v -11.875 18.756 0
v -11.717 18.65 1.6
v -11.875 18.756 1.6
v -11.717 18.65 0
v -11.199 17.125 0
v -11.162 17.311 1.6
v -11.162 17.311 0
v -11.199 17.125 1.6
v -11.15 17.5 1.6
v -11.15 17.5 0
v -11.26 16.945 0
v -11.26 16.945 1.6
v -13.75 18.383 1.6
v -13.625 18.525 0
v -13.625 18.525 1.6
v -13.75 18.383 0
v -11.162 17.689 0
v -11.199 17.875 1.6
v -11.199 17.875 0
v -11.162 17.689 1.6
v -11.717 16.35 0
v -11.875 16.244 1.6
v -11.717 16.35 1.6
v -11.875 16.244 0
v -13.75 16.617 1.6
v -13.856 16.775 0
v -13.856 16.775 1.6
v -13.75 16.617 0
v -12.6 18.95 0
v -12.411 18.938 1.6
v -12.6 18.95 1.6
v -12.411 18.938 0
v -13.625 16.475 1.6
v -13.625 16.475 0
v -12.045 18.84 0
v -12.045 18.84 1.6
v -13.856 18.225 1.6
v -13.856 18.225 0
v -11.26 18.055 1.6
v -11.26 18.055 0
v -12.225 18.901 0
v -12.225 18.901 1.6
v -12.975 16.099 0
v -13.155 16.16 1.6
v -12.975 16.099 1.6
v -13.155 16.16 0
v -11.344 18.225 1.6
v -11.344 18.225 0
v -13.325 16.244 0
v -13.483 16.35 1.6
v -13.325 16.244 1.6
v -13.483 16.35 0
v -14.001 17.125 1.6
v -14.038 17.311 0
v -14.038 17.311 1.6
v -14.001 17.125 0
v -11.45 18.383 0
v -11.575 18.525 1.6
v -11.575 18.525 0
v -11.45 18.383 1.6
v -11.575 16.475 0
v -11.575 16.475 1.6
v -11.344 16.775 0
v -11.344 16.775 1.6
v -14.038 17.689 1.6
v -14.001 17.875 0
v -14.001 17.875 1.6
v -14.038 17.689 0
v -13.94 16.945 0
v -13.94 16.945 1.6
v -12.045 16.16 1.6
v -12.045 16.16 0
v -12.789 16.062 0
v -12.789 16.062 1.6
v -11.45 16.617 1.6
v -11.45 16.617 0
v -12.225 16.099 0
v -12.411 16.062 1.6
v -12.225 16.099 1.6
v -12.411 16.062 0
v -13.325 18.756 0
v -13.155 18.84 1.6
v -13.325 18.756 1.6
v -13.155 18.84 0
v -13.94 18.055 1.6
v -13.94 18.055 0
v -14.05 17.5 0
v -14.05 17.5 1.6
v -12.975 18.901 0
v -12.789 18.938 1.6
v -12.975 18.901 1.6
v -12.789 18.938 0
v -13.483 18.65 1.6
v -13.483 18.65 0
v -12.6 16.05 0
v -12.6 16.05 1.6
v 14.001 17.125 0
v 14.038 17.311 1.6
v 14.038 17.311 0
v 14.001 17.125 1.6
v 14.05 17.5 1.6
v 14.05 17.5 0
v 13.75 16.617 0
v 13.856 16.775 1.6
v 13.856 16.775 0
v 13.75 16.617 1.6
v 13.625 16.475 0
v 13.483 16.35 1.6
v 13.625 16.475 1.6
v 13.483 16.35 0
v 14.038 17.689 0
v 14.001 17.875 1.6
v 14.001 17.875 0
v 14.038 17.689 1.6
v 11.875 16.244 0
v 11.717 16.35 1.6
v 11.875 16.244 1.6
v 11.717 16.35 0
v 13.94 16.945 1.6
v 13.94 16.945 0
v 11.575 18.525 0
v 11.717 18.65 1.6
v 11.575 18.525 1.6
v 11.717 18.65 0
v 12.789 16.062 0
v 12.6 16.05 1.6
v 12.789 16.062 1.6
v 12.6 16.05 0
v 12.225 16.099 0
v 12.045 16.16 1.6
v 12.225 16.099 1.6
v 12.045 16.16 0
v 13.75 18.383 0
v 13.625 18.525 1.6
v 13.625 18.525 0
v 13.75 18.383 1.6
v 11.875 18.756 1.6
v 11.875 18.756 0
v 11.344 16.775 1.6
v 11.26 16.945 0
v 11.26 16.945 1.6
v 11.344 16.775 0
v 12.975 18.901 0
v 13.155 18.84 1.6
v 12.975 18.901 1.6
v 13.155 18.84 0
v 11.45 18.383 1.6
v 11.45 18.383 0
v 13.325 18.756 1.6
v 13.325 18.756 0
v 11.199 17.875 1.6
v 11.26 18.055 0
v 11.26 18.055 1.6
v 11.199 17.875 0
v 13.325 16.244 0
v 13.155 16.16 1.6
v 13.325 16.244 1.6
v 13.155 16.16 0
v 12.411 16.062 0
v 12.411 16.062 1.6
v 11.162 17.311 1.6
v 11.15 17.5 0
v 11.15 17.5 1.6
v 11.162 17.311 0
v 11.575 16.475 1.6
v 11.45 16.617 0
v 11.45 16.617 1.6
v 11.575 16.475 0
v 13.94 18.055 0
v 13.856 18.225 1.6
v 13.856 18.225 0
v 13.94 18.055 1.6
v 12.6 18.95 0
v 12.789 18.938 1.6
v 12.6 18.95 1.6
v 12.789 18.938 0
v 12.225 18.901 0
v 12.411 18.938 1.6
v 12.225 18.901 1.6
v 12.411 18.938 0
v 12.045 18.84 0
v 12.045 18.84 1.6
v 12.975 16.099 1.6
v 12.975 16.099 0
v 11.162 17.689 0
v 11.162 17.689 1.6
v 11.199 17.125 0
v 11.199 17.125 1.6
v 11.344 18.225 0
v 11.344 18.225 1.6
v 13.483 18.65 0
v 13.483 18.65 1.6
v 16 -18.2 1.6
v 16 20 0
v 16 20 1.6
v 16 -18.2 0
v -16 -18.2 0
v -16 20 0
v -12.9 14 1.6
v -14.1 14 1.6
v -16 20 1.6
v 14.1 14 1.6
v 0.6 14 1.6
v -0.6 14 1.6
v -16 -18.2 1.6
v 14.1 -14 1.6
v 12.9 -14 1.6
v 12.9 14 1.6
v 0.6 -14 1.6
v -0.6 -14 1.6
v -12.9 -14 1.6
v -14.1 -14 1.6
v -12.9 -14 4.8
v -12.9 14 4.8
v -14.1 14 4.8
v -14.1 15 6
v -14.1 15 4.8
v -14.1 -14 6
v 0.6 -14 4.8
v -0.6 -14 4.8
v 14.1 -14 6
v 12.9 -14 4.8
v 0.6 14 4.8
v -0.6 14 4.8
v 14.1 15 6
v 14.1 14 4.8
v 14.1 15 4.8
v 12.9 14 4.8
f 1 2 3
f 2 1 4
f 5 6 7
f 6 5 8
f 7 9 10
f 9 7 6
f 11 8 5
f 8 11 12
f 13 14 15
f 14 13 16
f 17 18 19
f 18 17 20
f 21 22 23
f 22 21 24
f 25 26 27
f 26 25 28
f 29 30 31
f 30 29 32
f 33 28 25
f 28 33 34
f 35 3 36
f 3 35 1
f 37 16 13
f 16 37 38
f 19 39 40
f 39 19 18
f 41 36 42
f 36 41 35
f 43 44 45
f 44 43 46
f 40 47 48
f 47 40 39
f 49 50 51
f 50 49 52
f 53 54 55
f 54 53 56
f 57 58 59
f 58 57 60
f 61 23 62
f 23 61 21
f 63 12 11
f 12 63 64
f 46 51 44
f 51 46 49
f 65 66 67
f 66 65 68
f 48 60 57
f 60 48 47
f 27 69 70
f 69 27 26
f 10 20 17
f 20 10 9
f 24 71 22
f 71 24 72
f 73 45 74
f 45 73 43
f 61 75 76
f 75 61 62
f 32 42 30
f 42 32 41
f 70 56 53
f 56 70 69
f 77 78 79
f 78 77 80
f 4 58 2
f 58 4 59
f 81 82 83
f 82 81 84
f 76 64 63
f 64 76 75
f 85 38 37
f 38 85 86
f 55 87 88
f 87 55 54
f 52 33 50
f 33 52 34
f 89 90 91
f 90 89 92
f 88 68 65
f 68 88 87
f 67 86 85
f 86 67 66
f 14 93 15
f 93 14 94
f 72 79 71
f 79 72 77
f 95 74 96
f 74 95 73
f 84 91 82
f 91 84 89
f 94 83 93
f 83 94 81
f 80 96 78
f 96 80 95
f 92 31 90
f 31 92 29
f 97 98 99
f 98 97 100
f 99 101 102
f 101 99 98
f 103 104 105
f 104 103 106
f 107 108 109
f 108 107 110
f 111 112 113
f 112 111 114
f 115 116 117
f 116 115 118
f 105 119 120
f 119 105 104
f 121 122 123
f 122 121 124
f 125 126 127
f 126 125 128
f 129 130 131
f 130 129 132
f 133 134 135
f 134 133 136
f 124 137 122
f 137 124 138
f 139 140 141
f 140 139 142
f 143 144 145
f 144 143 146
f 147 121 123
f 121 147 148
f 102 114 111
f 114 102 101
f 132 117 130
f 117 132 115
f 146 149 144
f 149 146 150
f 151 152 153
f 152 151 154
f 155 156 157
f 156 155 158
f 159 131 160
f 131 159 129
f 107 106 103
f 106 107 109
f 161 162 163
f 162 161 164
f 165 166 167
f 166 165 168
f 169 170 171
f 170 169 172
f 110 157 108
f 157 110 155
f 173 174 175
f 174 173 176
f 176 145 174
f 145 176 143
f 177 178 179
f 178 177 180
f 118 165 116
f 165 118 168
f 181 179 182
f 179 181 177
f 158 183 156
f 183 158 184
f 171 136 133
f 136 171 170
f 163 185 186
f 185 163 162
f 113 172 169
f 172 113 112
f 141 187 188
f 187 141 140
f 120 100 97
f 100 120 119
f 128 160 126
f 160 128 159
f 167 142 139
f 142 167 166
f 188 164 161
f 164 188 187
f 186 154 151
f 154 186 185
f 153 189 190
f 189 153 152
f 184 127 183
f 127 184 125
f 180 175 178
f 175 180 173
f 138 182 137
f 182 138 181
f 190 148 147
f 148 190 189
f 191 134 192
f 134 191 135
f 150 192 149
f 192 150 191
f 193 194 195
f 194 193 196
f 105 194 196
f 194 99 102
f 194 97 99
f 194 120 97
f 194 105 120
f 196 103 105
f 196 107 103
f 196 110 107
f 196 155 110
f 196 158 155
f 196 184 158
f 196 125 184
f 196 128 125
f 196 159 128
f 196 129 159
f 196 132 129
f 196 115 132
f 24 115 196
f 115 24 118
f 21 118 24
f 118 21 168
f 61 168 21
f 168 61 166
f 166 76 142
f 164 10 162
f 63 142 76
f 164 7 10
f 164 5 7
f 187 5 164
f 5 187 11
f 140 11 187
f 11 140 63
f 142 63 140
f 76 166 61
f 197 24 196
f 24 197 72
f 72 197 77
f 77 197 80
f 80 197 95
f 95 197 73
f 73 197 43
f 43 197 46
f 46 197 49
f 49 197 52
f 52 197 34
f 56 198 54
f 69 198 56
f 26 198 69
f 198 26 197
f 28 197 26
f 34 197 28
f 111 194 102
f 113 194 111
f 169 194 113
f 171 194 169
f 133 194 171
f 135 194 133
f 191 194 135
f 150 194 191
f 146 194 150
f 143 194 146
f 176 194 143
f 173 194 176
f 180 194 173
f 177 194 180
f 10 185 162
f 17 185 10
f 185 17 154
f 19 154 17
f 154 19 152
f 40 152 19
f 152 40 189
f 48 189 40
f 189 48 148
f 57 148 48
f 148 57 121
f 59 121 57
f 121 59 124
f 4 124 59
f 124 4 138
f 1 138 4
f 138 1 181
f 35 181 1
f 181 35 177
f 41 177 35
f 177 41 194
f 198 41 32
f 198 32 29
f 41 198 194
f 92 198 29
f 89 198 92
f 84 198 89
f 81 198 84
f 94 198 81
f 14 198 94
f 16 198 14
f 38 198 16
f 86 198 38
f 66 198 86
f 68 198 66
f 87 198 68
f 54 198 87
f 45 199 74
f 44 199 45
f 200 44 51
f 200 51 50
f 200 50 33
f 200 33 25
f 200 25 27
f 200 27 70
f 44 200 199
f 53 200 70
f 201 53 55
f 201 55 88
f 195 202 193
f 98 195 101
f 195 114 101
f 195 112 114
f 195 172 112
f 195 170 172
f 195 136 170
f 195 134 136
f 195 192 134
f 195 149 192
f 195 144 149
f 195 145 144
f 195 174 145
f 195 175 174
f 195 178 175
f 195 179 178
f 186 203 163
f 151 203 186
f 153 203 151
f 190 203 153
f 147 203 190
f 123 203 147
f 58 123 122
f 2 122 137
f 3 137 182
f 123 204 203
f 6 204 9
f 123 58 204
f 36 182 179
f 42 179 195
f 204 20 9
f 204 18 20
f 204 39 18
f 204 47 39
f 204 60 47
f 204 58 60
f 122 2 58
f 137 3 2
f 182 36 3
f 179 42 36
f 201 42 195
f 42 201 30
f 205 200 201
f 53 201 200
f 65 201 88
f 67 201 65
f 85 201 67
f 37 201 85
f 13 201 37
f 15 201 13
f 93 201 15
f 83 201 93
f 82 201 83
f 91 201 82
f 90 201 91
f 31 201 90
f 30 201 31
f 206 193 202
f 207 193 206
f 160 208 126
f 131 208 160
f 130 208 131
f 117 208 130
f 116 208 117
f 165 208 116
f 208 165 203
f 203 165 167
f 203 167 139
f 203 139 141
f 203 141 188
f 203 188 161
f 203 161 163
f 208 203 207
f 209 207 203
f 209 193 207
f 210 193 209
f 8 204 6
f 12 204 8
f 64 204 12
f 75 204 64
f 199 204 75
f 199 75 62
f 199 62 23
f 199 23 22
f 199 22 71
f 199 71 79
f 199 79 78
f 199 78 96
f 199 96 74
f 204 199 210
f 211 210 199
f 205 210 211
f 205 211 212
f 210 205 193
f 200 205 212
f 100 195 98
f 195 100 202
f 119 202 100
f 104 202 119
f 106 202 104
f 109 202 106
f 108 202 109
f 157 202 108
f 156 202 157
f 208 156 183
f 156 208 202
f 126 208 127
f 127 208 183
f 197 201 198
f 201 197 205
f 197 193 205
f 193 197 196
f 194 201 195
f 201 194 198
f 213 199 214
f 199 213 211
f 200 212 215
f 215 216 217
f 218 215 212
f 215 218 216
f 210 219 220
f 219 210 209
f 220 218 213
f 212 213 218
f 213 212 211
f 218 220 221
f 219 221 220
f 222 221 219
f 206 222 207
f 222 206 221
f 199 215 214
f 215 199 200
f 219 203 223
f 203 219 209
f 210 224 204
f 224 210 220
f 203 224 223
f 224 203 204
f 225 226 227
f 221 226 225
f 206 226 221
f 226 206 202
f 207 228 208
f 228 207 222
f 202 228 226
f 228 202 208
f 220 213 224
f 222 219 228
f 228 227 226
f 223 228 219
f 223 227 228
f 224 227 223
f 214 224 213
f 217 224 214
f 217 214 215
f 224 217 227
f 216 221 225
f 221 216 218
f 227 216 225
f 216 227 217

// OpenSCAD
// file: model.scad
// Cabin screen for one Adafruit BME688 board (25.4 x 17.78, holes 20.32 x 12.7), open to the air.
// Two prints: a body that screws to the panelling or a DIN clip, and a cover with a baffle behind it.
// Air comes in a slot that faces down, rises between cover and baffle, turns over the baffle's top
// and falls onto the chip. Nothing outside has a straight line to the board.
// On the wall +Y is up and Z is out from the panel. Print the body as shown, back on the bed.
// The cover prints face down (part-cover.scad); the baffle bridges its three ribs.
part = "body";       // body, cover, assembly, section

/* [Back plate] */
plate_w = 32;        // x
plate_h = 62;        // y
plate_t = 3;
corner_r = 2;
mount_pitch = 51;    // two holes on the centre line: the DIN clip's heat inserts, or wood screws
mount_d = 3.4;       // M3 clearance
csk_d = 6.5;         // countersink at the front face

/* [Housing] */
house_h = 40;        // y, centred on the plate
depth = 16;          // z, front of the cover
wall = 1.6;
roof_over = 1;       // roof past the cover's face, with a lip that holds the cover's top edge
lip_h = 1;
floor_y = -15;       // underside of the chamber floor; the skirt below it shelters the inlet and the cable
notch_x = 8;         // cable notch in the floor, off centre, clear of the lower mount screw
notch_w = 5;
notch_d = 5;

/* [Board] */
board_l = 25.4;      // Adafruit board file; long edge upright
board_w = 17.78;
hole_dx = 20.32;
hole_dy = 12.7;
board_y = 4;         // board centre; leaves 4 mm under it for the Qwiic plug
pad_h = 2;
pad_d = 5;
pilot_d = 2.1;       // M2.5 self-tapping into the print

/* [Cover] */
cover_t = 1.6;
baffle_z = 10;       // baffle's back face; the chamber is plate_t to here
baffle_t = 1.2;
baffle_top = 14;     // y; the roof's underside is at 18.4, so air turns through 4.4
fit = 0.3;           // baffle to side wall, each side
rib_w = 1.2;
boss_d = 4.6;         // two cover screws, in the skirt
boss_y = -17.5;
cover_screw_d = 2.9; // M2.5 clearance

/* [Hidden] */
$fn = 48;
eps = 0.01;
in_w = plate_w - 2*wall;                 // 28.8 between the side walls
face_z = depth - cover_t;                // 14.4: the side walls' fronts, where the cover seats
roof_y = house_h/2 - wall;               // 18.4: roof underside
boss_x = in_w/2 - boss_d/2 + 0.5;
posts = [for (sx = [-1, 1], sy = [-1, 1]) [sx*hole_dy/2, board_y + sy*hole_dx/2]];

module rrect(l, w, r) { hull() for (sx = [-1, 1], sy = [-1, 1]) translate([sx*(l/2 - r), sy*(w/2 - r)]) circle(r = r); }

module body() {
    difference() {
        union() {
            linear_extrude(plate_t) rrect(plate_w, plate_h, corner_r);
            for (sx = [-1, 1]) translate([sx*(plate_w/2 - wall/2) - wall/2, -house_h/2, plate_t - eps]) cube([wall, house_h, face_z - plate_t + eps]);   // side walls
            translate([-plate_w/2, roof_y, plate_t - eps]) cube([plate_w, wall, depth + roof_over - plate_t + eps]);                                    // roof
            translate([-plate_w/2, roof_y - lip_h, depth + 0.2]) cube([plate_w, lip_h + eps, roof_over - 0.2]);                                         // lip
            translate([-in_w/2 - eps, floor_y, plate_t - eps]) cube([in_w + 2*eps, wall, baffle_z - 0.2 - plate_t + eps]);                              // chamber floor
            for (sx = [-1, 1]) translate([sx*boss_x, boss_y, plate_t - eps]) cylinder(d = boss_d, h = face_z - plate_t + eps);                           // cover bosses
            for (p = posts) translate([p[0], p[1], plate_t - eps]) cylinder(d = pad_d, h = pad_h + eps);                                                 // board pads
        }
        for (sy = [-1, 1]) translate([0, sy*mount_pitch/2, -1]) {
            cylinder(d = mount_d, h = plate_t + 2);
            translate([0, 0, plate_t + 1 - (csk_d - mount_d)/2]) cylinder(d1 = mount_d, d2 = csk_d + eps, h = (csk_d - mount_d)/2 + eps);
        }
        translate([notch_x - notch_w/2, floor_y - 1, baffle_z - 0.2 - notch_d]) cube([notch_w, wall + 2, notch_d + 1]);       // cable notch, open to the front
        for (sx = [-1, 1]) translate([sx*boss_x, boss_y, face_z - 8]) cylinder(d = pilot_d, h = 9);
        for (p = posts) translate([p[0], p[1], 1]) cylinder(d = pilot_d, h = plate_t + pad_h);
    }
}

module cover() {
    difference() {
        translate([-plate_w/2, -house_h/2, face_z]) cube([plate_w, house_h/2 + roof_y - 0.2, cover_t]);                       // face, tucked under the roof
        for (sx = [-1, 1]) translate([sx*boss_x, boss_y, face_z - 1]) cylinder(d = cover_screw_d, h = cover_t + 2);
    }
    translate([-in_w/2 + fit, floor_y, baffle_z]) cube([in_w - 2*fit, baffle_top - floor_y, baffle_t]);                        // baffle
    for (x = [-in_w/2 + fit, -rib_w/2, in_w/2 - fit - rib_w])                                                                 // ribs, above the bosses
        translate([x, floor_y + 1, baffle_z + baffle_t - eps]) cube([rib_w, baffle_top - floor_y - 1, face_z - baffle_z - baffle_t + 2*eps]);
}

module cover_print() { translate([0, 0, depth]) rotate([180, 0, 0]) cover(); }

module assembly() { body(); cover(); }

if (part == "body") body();
if (part == "cover") cover_print();
if (part == "assembly") assembly();
if (part == "section") difference() { assembly(); translate([1, -50, -1]) cube([50, 100, 50]); }
// main file
// The screen's cover, face down on the bed: face, three ribs, the baffle bridging them.
use <model.scad>

cover_print();
